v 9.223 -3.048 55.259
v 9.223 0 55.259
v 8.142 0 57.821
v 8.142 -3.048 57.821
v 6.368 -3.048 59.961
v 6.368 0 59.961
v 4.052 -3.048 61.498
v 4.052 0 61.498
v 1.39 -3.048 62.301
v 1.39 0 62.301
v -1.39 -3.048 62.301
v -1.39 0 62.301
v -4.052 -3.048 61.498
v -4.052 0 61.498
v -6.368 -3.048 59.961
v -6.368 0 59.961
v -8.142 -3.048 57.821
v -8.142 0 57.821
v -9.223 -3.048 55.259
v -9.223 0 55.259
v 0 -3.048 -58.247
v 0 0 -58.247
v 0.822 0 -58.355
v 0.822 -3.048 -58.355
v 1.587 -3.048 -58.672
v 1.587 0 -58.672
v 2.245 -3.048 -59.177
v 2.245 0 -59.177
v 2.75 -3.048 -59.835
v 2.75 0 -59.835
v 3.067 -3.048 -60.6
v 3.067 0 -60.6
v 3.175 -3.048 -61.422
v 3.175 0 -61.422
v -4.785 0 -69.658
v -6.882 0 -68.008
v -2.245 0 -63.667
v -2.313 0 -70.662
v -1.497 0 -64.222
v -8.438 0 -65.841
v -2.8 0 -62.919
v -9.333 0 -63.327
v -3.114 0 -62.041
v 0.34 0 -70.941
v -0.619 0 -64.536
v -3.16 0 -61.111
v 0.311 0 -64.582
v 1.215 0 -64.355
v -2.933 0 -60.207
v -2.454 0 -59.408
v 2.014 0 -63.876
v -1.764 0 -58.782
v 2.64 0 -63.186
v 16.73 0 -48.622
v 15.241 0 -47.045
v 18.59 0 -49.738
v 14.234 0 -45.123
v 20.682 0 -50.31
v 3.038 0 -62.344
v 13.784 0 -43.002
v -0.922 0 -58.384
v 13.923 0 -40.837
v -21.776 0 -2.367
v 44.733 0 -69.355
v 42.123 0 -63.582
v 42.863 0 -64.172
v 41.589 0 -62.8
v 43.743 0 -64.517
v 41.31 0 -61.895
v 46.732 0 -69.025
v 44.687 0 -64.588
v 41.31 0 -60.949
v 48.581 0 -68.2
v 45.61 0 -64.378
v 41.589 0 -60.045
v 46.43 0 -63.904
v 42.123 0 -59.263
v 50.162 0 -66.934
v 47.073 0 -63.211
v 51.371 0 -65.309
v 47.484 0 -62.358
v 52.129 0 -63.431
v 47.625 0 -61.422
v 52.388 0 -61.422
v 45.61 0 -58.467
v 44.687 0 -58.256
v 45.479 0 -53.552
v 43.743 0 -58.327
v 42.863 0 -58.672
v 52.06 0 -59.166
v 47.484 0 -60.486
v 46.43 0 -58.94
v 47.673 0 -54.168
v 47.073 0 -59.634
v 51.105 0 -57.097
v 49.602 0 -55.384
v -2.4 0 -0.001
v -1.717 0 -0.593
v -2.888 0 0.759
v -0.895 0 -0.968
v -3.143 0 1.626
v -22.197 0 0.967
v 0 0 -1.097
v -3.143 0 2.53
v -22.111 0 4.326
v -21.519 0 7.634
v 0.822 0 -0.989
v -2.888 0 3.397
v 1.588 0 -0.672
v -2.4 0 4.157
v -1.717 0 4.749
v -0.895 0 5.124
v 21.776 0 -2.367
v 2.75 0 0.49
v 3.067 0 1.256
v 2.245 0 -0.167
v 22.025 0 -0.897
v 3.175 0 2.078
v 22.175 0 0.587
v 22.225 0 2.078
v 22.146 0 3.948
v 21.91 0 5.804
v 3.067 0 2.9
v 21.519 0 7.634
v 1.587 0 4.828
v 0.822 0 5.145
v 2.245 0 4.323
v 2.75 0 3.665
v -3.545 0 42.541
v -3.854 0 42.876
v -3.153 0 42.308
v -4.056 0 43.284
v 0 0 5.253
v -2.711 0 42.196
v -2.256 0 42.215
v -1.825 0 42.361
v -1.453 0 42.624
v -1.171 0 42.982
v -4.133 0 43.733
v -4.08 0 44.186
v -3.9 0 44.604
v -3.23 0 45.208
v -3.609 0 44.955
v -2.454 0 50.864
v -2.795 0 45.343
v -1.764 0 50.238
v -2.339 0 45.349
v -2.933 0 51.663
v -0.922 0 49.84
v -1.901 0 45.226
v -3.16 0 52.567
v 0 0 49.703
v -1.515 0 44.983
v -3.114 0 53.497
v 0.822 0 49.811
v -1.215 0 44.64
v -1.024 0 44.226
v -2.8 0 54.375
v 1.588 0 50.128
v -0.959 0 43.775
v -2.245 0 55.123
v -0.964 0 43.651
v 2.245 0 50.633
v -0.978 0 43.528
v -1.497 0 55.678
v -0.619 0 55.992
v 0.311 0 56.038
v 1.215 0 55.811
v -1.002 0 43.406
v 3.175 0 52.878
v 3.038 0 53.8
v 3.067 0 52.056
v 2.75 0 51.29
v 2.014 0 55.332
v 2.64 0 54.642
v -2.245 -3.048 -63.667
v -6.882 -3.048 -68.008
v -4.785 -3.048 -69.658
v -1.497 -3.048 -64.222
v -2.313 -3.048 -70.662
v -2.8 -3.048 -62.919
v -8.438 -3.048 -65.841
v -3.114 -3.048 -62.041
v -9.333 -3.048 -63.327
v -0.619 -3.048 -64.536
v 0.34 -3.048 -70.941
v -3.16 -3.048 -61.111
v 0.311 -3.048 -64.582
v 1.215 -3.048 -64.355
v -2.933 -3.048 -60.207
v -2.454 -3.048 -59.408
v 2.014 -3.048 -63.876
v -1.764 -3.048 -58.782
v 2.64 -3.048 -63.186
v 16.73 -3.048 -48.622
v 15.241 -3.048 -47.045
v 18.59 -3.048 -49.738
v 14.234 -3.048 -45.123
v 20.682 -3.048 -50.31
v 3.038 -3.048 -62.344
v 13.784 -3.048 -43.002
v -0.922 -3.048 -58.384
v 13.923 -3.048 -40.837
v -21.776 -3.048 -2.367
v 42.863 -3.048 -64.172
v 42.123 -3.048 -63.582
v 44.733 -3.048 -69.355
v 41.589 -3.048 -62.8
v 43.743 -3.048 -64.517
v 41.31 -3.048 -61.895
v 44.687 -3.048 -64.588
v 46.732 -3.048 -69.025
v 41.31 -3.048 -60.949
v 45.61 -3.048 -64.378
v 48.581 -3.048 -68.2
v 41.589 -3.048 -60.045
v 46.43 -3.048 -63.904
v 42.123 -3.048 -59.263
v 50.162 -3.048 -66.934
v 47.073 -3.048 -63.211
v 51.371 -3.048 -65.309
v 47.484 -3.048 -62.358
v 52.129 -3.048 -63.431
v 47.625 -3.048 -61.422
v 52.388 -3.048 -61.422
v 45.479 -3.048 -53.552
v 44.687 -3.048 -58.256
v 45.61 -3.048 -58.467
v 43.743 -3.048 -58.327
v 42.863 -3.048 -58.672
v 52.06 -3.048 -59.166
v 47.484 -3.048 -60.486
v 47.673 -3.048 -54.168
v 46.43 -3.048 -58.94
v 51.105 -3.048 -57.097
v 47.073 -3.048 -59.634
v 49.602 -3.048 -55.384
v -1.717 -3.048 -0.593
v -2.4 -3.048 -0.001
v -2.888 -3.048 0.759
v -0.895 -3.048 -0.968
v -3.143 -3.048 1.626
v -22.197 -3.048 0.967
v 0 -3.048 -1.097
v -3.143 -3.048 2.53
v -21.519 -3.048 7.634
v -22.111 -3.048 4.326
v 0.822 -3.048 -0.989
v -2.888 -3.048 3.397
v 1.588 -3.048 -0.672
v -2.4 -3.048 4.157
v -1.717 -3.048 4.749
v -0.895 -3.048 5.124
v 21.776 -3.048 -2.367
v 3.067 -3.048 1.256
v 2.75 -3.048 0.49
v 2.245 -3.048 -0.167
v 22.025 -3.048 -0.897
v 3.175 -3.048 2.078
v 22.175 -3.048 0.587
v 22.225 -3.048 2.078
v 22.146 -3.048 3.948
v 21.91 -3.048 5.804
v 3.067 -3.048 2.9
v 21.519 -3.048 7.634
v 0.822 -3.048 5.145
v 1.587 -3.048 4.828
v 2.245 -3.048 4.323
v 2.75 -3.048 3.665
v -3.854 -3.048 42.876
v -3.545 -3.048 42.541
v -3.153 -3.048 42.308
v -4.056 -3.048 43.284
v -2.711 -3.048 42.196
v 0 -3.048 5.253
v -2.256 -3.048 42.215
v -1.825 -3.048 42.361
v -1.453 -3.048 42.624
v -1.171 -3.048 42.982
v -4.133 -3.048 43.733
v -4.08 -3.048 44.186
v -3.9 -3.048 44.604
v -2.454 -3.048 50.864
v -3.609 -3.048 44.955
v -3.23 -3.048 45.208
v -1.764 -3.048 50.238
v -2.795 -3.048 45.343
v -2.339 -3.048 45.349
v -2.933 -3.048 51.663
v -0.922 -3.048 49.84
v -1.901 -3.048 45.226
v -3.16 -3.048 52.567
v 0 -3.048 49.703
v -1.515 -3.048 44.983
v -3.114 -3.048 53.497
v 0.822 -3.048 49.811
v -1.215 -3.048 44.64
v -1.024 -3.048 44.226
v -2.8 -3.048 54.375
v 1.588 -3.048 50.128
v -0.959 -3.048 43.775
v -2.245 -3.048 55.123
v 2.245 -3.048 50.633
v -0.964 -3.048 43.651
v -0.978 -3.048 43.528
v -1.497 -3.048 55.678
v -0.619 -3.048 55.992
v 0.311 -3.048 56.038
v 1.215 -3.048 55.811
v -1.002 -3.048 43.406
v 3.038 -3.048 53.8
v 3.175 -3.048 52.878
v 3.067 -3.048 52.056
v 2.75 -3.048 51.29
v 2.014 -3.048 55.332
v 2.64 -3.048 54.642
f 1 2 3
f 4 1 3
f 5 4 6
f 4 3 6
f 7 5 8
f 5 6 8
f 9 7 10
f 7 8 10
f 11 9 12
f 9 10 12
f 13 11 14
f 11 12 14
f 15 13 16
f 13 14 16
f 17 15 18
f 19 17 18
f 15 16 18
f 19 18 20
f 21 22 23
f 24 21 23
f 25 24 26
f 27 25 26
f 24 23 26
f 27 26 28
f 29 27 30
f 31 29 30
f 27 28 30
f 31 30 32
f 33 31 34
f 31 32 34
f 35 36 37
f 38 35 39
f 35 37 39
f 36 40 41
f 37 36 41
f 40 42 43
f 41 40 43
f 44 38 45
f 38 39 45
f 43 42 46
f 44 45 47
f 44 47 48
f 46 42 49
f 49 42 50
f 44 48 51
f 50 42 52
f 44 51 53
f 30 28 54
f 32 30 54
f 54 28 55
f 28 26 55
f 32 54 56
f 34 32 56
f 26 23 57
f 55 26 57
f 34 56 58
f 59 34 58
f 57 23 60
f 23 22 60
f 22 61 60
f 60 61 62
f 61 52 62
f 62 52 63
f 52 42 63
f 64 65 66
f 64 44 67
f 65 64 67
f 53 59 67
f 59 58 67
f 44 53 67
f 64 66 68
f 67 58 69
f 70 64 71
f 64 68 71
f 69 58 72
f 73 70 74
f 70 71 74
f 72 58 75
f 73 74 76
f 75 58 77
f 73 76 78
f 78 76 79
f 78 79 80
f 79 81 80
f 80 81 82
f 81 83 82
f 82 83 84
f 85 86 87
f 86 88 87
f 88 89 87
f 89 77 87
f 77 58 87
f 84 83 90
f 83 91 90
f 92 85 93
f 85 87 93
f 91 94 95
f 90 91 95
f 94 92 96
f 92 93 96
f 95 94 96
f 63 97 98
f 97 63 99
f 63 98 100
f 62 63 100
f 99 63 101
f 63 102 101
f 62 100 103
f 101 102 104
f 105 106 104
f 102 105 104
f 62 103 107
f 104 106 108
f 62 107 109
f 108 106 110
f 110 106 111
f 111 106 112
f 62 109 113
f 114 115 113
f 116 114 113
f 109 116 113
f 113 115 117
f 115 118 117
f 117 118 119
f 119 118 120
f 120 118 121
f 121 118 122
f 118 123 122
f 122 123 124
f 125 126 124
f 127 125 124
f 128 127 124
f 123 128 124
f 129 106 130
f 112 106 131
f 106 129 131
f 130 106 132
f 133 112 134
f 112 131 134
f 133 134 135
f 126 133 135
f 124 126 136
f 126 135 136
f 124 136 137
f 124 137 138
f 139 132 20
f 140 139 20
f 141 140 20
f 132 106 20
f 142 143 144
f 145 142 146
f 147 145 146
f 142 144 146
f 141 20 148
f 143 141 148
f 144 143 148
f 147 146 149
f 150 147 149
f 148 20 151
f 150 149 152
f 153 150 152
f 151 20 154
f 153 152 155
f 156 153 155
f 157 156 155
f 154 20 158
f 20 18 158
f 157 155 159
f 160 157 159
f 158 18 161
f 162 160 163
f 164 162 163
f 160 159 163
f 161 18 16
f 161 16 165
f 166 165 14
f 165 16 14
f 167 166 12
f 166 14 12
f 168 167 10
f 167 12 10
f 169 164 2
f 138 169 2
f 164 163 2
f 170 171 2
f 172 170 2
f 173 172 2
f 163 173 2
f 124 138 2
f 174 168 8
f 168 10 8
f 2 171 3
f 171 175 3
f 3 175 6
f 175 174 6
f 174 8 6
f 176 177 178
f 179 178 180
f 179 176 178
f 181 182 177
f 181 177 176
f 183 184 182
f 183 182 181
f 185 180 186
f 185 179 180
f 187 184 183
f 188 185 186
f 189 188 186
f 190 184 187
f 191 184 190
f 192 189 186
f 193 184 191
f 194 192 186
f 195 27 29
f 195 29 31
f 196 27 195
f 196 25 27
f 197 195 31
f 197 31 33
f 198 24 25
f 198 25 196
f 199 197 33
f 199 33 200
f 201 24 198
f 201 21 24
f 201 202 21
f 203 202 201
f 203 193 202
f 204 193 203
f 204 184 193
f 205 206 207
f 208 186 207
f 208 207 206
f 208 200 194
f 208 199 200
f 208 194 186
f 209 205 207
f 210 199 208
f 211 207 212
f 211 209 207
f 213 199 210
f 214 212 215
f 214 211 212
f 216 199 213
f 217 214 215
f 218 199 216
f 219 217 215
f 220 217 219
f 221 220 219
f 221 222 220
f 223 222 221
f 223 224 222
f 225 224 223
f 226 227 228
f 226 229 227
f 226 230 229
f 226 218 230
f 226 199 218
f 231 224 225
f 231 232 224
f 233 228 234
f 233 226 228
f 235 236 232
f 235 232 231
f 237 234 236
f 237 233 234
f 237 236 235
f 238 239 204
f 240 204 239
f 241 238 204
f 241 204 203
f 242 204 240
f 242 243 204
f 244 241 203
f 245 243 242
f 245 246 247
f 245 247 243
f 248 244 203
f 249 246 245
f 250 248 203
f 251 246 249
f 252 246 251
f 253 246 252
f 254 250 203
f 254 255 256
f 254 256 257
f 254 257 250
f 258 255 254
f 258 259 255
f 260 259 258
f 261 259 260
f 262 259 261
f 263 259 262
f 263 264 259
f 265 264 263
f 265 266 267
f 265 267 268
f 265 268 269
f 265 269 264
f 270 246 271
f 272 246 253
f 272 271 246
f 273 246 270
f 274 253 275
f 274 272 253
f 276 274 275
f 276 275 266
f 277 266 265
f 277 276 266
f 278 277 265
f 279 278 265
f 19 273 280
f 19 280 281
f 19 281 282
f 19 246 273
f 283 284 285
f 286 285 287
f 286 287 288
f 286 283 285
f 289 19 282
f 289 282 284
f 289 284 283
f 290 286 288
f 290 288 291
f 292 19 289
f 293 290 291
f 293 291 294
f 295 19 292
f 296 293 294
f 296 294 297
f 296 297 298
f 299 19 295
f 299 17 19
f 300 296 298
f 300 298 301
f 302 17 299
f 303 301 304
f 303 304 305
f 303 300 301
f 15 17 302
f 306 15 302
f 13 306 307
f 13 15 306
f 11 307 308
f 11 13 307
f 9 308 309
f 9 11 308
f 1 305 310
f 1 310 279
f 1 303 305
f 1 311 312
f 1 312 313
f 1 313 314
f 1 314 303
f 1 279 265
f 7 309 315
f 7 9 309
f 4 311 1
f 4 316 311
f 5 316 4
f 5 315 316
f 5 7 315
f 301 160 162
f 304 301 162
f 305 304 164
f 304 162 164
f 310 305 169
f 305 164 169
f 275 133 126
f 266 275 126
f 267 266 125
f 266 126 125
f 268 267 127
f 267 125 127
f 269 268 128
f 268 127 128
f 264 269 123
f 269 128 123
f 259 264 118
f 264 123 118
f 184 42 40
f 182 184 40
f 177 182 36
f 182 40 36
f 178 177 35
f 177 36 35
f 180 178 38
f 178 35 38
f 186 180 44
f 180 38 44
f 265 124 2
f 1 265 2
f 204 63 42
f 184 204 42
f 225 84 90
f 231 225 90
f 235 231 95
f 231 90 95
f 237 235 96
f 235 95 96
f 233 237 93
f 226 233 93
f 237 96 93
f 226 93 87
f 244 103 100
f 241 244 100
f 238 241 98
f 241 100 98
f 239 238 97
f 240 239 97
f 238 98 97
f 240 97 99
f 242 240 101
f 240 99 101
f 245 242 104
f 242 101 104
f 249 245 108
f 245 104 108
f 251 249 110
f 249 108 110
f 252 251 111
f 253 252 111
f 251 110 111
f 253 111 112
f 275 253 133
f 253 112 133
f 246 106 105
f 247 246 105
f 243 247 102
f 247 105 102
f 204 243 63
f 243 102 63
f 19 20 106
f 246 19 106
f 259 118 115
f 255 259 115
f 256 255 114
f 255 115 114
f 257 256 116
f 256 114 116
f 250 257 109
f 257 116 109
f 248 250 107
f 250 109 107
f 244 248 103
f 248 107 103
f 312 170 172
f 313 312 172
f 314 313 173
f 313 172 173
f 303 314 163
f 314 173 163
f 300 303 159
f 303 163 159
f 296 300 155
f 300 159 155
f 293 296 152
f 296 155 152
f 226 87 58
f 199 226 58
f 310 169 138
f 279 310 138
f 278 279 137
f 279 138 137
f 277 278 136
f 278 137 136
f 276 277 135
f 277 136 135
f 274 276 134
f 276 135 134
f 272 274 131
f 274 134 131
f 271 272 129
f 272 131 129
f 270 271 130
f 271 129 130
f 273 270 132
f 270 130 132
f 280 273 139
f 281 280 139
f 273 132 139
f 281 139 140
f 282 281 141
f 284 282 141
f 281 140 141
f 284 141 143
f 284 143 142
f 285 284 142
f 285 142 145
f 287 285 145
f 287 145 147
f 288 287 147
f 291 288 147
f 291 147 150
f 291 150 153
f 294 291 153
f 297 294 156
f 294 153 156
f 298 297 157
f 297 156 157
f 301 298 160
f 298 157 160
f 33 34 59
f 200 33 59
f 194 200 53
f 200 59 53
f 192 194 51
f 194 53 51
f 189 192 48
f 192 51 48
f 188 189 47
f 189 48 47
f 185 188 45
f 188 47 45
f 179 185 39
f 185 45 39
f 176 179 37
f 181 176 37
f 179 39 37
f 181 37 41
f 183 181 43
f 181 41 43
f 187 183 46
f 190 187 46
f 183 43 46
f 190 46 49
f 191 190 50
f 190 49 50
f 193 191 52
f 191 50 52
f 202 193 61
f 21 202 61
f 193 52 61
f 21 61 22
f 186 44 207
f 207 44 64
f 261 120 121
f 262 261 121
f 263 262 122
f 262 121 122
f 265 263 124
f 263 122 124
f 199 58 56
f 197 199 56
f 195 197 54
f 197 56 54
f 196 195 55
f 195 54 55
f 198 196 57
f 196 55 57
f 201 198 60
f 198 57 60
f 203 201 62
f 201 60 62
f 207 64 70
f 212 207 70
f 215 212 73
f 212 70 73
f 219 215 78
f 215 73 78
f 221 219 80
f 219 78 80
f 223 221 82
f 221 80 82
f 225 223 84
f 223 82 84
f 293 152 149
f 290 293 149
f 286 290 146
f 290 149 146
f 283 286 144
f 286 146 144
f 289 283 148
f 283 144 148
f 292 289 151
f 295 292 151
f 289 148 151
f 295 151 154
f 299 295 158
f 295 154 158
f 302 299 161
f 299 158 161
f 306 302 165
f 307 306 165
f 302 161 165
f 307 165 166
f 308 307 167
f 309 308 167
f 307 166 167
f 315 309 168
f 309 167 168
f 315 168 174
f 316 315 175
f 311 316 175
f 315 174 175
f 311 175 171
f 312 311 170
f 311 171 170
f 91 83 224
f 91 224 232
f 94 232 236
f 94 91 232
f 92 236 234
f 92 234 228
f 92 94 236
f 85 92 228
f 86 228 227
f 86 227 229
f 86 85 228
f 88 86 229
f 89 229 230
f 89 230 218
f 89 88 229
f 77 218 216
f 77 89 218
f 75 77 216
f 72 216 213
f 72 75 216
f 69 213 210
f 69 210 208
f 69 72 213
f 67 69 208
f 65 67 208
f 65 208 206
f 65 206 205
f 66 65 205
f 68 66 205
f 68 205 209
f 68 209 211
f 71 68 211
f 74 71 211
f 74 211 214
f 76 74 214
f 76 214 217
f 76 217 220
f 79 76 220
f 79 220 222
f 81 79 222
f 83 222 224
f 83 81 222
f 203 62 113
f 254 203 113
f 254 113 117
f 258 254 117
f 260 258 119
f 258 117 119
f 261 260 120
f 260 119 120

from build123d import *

# Parameters (mm, degrees)
F0_R     = 3.175
F1_DEPTH = 3.048


with BuildPart() as f1:
    # F0 (on Front) → F1 (new body)
    with BuildSketch(Plane.XZ):
        with BuildLine():
            ThreePointArc((-1.0023336327, 43.4057982907), (-0.5018639238, 43.3661433225), (0, 43.3529127479))
            ThreePointArc((0, 43.3529127479), (6.7351920908, 46.1427206571), (9.525, 52.8779127479))
            ThreePointArc((9.525, 52.8779127479), (9.4490828569, 54.0781036338), (9.2225415932, 55.2591627479))
            ThreePointArc((9.2225415932, 55.2591627479), (0, 62.4029127479), (-9.2225415932, 55.2591627479))
            ThreePointArc((-9.2225415932, 55.2591627479), (-8.6217427785, 48.8293109569), (-4.0577774611, 44.2604846468))
            ThreePointArc((-4.0577774611, 44.2604846468), (-2.3007024801, 45.3437609387), (-0.9587182239, 43.7753610313))
            ThreePointArc((-0.9587182239, 43.7753610313), (-0.9696597824, 43.5892972498), (-1.0023336327, 43.4057982907))
        make_face()
        with BuildLine():
            ThreePointArc((3.175, 52.8779127479), (2.2450640303, 50.6328487176), (0, 49.7029127479))
            ThreePointArc((0, 49.7029127479), (-2.2450640303, 55.1229767781), (3.175, 52.8779127479))
        make_face(mode=Mode.SUBTRACT)
        with BuildLine():
            ThreePointArc((9.525, 52.8779127479), (6.7351920908, 46.1427206571), (0, 43.3529127479))
            Line((0, 43.3529127479), (0, 24.3029127479))
            ThreePointArc((0, 24.3029127479), (13.6099773833, 19.6483179972), (21.5192637174, 7.6341627479))
            Line((21.5192637174, 7.6341627479), (9.2225415932, 55.2591627479))
            ThreePointArc((9.2225415932, 55.2591627479), (9.4490828569, 54.0781036338), (9.525, 52.8779127479))
        make_face()
        with BuildLine():
            Line((0, 24.3029127479), (0, 43.3529127479))
            ThreePointArc((0, 43.3529127479), (-0.5018639238, 43.3661433225), (-1.0023336327, 43.4057982907))
            ThreePointArc((-1.0023336327, 43.4057982907), (-2.9738669395, 42.2465468418), (-4.0577774611, 44.2604846468))
            ThreePointArc((-4.0577774611, 44.2604846468), (-8.6217427785, 48.8293109569), (-9.2225415932, 55.2591627479))
            Line((-9.2225415932, 55.2591627479), (-21.5192637174, 7.6341627479))
            ThreePointArc((-21.5192637174, 7.6341627479), (-13.6099773833, 19.6483179972), (0, 24.3029127479))
        make_face()
        with BuildLine():
            ThreePointArc((21.5192637174, 7.6341627479), (13.6099773833, 19.6483179972), (0, 24.3029127479))
            Line((0, 24.3029127479), (0, 5.2529127479))
            ThreePointArc((0, 5.2529127479), (2.2450640303, 4.3229767781), (3.175, 2.0779127479))
            ThreePointArc((3.175, 2.0779127479), (2.2450640303, -0.1671512824), (0, -1.0970872521))
            Line((0, -1.0970872521), (0, -20.1470872521))
            ThreePointArc((0, -20.1470872521), (14.0563241994, -15.137498226), (21.7759638133, -2.3670872521))
            ThreePointArc((21.7759638133, -2.3670872521), (22.1124560005, -0.1558989327), (22.225, 2.0779127479))
            ThreePointArc((22.225, 2.0779127479), (22.0478599995, 4.8783581483), (21.5192637174, 7.6341627479))
        make_face()
        with BuildLine():
            Line((0, 5.2529127479), (0, 24.3029127479))
            ThreePointArc((0, 24.3029127479), (-13.6099773833, 19.6483179972), (-21.5192637174, 7.6341627479))
            ThreePointArc((-21.5192637174, 7.6341627479), (-22.2176828703, 2.6481695983), (-21.7759638133, -2.3670872521))
            ThreePointArc((-21.7759638133, -2.3670872521), (-14.0563241994, -15.137498226), (0, -20.1470872521))
            Line((0, -20.1470872521), (0, -1.0970872521))
            ThreePointArc((0, -1.0970872521), (-3.175, 2.0779127479), (0, 5.2529127479))
        make_face()
        with BuildLine():
            ThreePointArc((0, -20.1470872521), (-14.0563241994, -15.137498226), (-21.7759638133, -2.3670872521))
            Line((-21.7759638133, -2.3670872521), (-9.33255592, -63.3270872521))
            ThreePointArc((-9.33255592, -63.3270872521), (-7.3780332745, -55.3979483095), (0, -51.8970872521))
            Line((0, -51.8970872521), (0, -20.1470872521))
        make_face()
        with BuildLine():
            ThreePointArc((21.7759638133, -2.3670872521), (14.0563241994, -15.137498226), (0, -20.1470872521))
            Line((0, -20.1470872521), (0, -51.8970872521))
            ThreePointArc((0, -51.8970872521), (6.7351920908, -54.6868951613), (9.525, -61.4220872521))
            ThreePointArc((9.525, -61.4220872521), (6.8544083402, -68.0359145334), (0.3401787284, -70.9410106909))
            Line((0.3401787284, -70.9410106909), (44.7334821429, -69.3545234558))
            ThreePointArc((44.7334821429, -69.3545234558), (36.5213147589, -61.0481131928), (45.4788644675, -53.5515507928))
            Line((45.4788644675, -53.5515507928), (20.682408707, -50.3100700647))
            ThreePointArc((20.682408707, -50.3100700647), (15.241157261, -47.0445132049), (13.9233460165, -40.836900747))
            Line((13.9233460165, -40.836900747), (21.7759638133, -2.3670872521))
        make_face()
        with BuildLine():
            ThreePointArc((0, -51.8970872521), (-7.3780332745, -55.3979483095), (-9.33255592, -63.3270872521))
            ThreePointArc((-9.33255592, -63.3270872521), (-5.8914064044, -68.9065348322), (0.3401787284, -70.9410106909))
            ThreePointArc((0.3401787284, -70.9410106909), (6.8544083402, -68.0359145334), (9.525, -61.4220872521))
            ThreePointArc((9.525, -61.4220872521), (6.7351920908, -54.6868951613), (0, -51.8970872521))
        make_face()
        with BuildLine():
            ThreePointArc((3.175, -61.4220872521), (-2.2450640303, -63.6671512824), (0, -58.2470872521))
            ThreePointArc((0, -58.2470872521), (2.2450640303, -59.1770232219), (3.175, -61.4220872521))
        make_face(mode=Mode.SUBTRACT)
        with BuildLine():
            ThreePointArc((45.4788644675, -53.5515507928), (36.5213147589, -61.0481131928), (44.7334821429, -69.3545234558))
            ThreePointArc((44.7334821429, -69.3545234558), (50.1620069047, -66.9336100336), (52.3875, -61.4220872521))
            ThreePointArc((52.3875, -61.4220872521), (50.4153381279, -56.1858054349), (45.4788644675, -53.5515507928))
        make_face()
        with Locations((44.45, -61.4220872521)):
            Circle(F0_R, mode=Mode.SUBTRACT)
    extrude(amount=F1_DEPTH)


solid = f1.part
